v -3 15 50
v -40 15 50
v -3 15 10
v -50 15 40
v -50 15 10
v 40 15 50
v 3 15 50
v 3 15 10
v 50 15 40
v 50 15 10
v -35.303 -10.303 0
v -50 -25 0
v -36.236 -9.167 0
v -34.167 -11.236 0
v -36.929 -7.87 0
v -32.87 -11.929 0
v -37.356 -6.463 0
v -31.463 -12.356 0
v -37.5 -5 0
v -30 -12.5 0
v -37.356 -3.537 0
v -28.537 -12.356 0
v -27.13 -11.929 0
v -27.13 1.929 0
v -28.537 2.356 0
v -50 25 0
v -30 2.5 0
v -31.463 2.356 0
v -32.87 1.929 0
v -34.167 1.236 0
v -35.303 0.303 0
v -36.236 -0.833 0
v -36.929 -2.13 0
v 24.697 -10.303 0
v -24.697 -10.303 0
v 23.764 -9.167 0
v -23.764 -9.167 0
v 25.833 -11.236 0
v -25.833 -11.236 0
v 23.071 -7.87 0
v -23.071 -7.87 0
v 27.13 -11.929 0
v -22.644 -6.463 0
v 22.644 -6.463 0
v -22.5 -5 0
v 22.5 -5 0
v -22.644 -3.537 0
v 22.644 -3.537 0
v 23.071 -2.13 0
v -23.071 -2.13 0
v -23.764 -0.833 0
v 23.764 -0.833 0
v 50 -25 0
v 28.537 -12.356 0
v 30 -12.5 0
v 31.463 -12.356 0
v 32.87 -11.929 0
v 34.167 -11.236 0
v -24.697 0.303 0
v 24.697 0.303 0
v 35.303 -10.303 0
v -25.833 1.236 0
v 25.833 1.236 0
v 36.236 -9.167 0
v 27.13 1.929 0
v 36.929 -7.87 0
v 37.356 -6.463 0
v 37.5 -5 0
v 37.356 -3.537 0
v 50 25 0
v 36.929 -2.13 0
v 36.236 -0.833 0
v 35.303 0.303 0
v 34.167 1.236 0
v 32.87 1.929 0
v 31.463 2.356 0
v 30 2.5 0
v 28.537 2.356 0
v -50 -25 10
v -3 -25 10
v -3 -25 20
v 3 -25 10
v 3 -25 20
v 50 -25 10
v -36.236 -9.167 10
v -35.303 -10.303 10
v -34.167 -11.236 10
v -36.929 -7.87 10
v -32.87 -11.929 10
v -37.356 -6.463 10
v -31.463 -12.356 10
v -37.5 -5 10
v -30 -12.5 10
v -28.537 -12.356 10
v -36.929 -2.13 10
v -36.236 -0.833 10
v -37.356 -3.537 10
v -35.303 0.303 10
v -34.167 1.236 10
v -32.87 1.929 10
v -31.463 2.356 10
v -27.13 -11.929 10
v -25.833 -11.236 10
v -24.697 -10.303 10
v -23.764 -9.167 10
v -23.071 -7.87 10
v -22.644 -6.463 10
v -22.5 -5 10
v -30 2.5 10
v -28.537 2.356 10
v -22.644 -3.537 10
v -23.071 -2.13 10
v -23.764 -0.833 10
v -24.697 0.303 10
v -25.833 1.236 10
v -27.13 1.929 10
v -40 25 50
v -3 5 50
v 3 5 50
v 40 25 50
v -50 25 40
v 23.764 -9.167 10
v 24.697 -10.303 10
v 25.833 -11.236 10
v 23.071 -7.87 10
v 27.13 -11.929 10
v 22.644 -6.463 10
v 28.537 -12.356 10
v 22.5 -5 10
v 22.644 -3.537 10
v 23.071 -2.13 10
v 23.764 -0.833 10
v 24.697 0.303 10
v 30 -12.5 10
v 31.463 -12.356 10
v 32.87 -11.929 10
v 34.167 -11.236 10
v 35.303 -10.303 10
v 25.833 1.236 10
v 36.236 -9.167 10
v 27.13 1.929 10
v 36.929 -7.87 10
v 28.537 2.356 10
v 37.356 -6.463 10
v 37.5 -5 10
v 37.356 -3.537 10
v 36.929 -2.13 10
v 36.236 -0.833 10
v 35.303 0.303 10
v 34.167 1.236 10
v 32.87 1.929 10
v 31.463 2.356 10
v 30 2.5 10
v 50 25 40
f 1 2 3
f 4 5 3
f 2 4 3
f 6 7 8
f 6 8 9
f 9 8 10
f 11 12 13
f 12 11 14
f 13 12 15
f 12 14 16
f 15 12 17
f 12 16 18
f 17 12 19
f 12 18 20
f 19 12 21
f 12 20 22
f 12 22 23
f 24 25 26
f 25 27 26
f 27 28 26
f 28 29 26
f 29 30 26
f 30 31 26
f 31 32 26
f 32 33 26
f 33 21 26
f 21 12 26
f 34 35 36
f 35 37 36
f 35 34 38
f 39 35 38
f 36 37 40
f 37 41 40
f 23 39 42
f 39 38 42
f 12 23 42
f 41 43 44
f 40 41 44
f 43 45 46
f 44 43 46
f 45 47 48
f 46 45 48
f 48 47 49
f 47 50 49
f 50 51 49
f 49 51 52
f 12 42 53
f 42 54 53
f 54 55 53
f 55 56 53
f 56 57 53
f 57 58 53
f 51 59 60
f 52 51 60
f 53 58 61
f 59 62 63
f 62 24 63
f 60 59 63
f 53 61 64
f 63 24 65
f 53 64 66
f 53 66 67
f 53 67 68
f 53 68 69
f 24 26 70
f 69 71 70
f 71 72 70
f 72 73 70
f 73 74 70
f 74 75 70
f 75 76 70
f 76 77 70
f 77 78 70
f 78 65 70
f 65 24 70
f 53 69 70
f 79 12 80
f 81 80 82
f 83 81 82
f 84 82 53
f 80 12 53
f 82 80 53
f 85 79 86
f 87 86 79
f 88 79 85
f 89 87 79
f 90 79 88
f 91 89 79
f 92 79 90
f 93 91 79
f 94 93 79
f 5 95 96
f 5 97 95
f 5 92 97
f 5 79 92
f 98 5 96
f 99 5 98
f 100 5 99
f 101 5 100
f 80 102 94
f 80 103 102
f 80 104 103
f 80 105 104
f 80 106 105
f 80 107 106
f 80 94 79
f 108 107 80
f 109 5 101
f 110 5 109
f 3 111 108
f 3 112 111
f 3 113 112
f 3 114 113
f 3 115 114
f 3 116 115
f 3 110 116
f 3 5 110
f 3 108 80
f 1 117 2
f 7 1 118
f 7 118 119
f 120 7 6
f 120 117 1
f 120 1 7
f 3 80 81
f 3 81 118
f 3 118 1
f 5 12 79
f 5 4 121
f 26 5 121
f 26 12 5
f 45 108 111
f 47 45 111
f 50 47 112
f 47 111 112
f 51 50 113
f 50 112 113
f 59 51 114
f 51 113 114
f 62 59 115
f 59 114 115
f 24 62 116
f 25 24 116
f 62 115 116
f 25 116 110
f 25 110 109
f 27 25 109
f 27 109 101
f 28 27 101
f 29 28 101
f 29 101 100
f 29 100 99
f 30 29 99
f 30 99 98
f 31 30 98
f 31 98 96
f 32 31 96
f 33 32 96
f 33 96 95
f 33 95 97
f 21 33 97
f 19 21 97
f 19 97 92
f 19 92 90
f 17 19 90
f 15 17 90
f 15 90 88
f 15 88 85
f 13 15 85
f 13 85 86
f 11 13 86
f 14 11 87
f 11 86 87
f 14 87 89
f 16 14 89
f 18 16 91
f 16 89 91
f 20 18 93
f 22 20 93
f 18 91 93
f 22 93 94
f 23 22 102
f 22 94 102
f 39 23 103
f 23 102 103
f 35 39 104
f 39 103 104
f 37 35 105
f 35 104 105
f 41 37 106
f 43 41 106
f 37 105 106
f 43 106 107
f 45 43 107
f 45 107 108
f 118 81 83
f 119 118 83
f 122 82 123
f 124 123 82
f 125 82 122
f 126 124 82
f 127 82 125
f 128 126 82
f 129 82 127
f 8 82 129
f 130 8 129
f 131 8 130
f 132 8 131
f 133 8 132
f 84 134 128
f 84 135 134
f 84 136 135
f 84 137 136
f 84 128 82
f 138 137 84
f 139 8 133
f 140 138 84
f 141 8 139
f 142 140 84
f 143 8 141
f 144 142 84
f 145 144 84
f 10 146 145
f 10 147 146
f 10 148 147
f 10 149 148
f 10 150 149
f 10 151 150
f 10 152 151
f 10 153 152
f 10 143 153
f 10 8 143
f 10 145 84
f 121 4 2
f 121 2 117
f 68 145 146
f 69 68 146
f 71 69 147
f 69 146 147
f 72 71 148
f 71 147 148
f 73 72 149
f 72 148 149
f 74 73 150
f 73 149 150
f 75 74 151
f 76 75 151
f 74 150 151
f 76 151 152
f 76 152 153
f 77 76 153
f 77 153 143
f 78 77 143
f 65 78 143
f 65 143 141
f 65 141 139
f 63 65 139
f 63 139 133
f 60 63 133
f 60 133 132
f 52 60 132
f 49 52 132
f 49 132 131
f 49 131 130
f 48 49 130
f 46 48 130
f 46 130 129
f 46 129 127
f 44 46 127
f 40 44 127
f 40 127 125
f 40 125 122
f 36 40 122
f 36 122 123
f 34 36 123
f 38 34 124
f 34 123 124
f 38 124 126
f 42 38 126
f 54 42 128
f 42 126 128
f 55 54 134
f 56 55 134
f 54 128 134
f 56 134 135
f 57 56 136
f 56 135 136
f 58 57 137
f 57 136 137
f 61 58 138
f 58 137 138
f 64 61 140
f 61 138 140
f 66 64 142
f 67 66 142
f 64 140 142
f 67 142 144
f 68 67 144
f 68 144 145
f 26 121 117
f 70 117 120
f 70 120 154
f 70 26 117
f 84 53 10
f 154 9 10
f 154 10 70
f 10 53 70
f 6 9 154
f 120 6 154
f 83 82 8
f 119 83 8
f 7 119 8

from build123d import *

# Parameters (mm, degrees)
F0_W     = 100
F0_H     = 50
F1_DEPTH = 50
F2_T     = -10
F3_R     = 7.5
F4_DEPTH = 10.001
F5_W     = 6
F5_H     = 40
F6_DEPTH = 40
F7_SIZE  = 10
F8_SIZE  = 30


with BuildPart() as f1:
    # F0 (on Top) → F1 (new body)
    with BuildSketch(Plane.XY):
        Rectangle(F0_W, F0_H)
    extrude(amount=F1_DEPTH)

    # F2
    f2_openings = [f1.faces().sort_by_distance(p)[0] for p in [
        (50, 0, 25),
        (0, 0, 50),
        (0, -25, 25),
        (-50, 0, 25),
    ]]
    offset(amount=F2_T, openings=f2_openings)

    # F3 (on face) → F4 (cut, through all)
    with BuildSketch(Plane.XY.offset(10)):
        with Locations((-30, -5)):
            Circle(F3_R)
        with Locations((30, -5)):
            Circle(F3_R)
    extrude(amount=-F4_DEPTH, mode=Mode.SUBTRACT)

    # F5 (on face) → F6 (join, through all)
    with BuildSketch(Plane.XY.offset(10)):
        with Locations((0, -5)):
            Rectangle(F5_W, F5_H)
    extrude(amount=F6_DEPTH)

    # F7
    f7_edges = [f1.edges().sort_by_distance(p)[0] for p in [
        (50, 20, 50),
        (-50, 20, 50),
    ]]
    chamfer(f7_edges, length=F7_SIZE)

    # F8
    f8_edges = [f1.edges().sort_by_distance(p)[0] for p in [
        (0, -25, 50),
    ]]
    chamfer(f8_edges, length=F8_SIZE)


solid = f1.part
